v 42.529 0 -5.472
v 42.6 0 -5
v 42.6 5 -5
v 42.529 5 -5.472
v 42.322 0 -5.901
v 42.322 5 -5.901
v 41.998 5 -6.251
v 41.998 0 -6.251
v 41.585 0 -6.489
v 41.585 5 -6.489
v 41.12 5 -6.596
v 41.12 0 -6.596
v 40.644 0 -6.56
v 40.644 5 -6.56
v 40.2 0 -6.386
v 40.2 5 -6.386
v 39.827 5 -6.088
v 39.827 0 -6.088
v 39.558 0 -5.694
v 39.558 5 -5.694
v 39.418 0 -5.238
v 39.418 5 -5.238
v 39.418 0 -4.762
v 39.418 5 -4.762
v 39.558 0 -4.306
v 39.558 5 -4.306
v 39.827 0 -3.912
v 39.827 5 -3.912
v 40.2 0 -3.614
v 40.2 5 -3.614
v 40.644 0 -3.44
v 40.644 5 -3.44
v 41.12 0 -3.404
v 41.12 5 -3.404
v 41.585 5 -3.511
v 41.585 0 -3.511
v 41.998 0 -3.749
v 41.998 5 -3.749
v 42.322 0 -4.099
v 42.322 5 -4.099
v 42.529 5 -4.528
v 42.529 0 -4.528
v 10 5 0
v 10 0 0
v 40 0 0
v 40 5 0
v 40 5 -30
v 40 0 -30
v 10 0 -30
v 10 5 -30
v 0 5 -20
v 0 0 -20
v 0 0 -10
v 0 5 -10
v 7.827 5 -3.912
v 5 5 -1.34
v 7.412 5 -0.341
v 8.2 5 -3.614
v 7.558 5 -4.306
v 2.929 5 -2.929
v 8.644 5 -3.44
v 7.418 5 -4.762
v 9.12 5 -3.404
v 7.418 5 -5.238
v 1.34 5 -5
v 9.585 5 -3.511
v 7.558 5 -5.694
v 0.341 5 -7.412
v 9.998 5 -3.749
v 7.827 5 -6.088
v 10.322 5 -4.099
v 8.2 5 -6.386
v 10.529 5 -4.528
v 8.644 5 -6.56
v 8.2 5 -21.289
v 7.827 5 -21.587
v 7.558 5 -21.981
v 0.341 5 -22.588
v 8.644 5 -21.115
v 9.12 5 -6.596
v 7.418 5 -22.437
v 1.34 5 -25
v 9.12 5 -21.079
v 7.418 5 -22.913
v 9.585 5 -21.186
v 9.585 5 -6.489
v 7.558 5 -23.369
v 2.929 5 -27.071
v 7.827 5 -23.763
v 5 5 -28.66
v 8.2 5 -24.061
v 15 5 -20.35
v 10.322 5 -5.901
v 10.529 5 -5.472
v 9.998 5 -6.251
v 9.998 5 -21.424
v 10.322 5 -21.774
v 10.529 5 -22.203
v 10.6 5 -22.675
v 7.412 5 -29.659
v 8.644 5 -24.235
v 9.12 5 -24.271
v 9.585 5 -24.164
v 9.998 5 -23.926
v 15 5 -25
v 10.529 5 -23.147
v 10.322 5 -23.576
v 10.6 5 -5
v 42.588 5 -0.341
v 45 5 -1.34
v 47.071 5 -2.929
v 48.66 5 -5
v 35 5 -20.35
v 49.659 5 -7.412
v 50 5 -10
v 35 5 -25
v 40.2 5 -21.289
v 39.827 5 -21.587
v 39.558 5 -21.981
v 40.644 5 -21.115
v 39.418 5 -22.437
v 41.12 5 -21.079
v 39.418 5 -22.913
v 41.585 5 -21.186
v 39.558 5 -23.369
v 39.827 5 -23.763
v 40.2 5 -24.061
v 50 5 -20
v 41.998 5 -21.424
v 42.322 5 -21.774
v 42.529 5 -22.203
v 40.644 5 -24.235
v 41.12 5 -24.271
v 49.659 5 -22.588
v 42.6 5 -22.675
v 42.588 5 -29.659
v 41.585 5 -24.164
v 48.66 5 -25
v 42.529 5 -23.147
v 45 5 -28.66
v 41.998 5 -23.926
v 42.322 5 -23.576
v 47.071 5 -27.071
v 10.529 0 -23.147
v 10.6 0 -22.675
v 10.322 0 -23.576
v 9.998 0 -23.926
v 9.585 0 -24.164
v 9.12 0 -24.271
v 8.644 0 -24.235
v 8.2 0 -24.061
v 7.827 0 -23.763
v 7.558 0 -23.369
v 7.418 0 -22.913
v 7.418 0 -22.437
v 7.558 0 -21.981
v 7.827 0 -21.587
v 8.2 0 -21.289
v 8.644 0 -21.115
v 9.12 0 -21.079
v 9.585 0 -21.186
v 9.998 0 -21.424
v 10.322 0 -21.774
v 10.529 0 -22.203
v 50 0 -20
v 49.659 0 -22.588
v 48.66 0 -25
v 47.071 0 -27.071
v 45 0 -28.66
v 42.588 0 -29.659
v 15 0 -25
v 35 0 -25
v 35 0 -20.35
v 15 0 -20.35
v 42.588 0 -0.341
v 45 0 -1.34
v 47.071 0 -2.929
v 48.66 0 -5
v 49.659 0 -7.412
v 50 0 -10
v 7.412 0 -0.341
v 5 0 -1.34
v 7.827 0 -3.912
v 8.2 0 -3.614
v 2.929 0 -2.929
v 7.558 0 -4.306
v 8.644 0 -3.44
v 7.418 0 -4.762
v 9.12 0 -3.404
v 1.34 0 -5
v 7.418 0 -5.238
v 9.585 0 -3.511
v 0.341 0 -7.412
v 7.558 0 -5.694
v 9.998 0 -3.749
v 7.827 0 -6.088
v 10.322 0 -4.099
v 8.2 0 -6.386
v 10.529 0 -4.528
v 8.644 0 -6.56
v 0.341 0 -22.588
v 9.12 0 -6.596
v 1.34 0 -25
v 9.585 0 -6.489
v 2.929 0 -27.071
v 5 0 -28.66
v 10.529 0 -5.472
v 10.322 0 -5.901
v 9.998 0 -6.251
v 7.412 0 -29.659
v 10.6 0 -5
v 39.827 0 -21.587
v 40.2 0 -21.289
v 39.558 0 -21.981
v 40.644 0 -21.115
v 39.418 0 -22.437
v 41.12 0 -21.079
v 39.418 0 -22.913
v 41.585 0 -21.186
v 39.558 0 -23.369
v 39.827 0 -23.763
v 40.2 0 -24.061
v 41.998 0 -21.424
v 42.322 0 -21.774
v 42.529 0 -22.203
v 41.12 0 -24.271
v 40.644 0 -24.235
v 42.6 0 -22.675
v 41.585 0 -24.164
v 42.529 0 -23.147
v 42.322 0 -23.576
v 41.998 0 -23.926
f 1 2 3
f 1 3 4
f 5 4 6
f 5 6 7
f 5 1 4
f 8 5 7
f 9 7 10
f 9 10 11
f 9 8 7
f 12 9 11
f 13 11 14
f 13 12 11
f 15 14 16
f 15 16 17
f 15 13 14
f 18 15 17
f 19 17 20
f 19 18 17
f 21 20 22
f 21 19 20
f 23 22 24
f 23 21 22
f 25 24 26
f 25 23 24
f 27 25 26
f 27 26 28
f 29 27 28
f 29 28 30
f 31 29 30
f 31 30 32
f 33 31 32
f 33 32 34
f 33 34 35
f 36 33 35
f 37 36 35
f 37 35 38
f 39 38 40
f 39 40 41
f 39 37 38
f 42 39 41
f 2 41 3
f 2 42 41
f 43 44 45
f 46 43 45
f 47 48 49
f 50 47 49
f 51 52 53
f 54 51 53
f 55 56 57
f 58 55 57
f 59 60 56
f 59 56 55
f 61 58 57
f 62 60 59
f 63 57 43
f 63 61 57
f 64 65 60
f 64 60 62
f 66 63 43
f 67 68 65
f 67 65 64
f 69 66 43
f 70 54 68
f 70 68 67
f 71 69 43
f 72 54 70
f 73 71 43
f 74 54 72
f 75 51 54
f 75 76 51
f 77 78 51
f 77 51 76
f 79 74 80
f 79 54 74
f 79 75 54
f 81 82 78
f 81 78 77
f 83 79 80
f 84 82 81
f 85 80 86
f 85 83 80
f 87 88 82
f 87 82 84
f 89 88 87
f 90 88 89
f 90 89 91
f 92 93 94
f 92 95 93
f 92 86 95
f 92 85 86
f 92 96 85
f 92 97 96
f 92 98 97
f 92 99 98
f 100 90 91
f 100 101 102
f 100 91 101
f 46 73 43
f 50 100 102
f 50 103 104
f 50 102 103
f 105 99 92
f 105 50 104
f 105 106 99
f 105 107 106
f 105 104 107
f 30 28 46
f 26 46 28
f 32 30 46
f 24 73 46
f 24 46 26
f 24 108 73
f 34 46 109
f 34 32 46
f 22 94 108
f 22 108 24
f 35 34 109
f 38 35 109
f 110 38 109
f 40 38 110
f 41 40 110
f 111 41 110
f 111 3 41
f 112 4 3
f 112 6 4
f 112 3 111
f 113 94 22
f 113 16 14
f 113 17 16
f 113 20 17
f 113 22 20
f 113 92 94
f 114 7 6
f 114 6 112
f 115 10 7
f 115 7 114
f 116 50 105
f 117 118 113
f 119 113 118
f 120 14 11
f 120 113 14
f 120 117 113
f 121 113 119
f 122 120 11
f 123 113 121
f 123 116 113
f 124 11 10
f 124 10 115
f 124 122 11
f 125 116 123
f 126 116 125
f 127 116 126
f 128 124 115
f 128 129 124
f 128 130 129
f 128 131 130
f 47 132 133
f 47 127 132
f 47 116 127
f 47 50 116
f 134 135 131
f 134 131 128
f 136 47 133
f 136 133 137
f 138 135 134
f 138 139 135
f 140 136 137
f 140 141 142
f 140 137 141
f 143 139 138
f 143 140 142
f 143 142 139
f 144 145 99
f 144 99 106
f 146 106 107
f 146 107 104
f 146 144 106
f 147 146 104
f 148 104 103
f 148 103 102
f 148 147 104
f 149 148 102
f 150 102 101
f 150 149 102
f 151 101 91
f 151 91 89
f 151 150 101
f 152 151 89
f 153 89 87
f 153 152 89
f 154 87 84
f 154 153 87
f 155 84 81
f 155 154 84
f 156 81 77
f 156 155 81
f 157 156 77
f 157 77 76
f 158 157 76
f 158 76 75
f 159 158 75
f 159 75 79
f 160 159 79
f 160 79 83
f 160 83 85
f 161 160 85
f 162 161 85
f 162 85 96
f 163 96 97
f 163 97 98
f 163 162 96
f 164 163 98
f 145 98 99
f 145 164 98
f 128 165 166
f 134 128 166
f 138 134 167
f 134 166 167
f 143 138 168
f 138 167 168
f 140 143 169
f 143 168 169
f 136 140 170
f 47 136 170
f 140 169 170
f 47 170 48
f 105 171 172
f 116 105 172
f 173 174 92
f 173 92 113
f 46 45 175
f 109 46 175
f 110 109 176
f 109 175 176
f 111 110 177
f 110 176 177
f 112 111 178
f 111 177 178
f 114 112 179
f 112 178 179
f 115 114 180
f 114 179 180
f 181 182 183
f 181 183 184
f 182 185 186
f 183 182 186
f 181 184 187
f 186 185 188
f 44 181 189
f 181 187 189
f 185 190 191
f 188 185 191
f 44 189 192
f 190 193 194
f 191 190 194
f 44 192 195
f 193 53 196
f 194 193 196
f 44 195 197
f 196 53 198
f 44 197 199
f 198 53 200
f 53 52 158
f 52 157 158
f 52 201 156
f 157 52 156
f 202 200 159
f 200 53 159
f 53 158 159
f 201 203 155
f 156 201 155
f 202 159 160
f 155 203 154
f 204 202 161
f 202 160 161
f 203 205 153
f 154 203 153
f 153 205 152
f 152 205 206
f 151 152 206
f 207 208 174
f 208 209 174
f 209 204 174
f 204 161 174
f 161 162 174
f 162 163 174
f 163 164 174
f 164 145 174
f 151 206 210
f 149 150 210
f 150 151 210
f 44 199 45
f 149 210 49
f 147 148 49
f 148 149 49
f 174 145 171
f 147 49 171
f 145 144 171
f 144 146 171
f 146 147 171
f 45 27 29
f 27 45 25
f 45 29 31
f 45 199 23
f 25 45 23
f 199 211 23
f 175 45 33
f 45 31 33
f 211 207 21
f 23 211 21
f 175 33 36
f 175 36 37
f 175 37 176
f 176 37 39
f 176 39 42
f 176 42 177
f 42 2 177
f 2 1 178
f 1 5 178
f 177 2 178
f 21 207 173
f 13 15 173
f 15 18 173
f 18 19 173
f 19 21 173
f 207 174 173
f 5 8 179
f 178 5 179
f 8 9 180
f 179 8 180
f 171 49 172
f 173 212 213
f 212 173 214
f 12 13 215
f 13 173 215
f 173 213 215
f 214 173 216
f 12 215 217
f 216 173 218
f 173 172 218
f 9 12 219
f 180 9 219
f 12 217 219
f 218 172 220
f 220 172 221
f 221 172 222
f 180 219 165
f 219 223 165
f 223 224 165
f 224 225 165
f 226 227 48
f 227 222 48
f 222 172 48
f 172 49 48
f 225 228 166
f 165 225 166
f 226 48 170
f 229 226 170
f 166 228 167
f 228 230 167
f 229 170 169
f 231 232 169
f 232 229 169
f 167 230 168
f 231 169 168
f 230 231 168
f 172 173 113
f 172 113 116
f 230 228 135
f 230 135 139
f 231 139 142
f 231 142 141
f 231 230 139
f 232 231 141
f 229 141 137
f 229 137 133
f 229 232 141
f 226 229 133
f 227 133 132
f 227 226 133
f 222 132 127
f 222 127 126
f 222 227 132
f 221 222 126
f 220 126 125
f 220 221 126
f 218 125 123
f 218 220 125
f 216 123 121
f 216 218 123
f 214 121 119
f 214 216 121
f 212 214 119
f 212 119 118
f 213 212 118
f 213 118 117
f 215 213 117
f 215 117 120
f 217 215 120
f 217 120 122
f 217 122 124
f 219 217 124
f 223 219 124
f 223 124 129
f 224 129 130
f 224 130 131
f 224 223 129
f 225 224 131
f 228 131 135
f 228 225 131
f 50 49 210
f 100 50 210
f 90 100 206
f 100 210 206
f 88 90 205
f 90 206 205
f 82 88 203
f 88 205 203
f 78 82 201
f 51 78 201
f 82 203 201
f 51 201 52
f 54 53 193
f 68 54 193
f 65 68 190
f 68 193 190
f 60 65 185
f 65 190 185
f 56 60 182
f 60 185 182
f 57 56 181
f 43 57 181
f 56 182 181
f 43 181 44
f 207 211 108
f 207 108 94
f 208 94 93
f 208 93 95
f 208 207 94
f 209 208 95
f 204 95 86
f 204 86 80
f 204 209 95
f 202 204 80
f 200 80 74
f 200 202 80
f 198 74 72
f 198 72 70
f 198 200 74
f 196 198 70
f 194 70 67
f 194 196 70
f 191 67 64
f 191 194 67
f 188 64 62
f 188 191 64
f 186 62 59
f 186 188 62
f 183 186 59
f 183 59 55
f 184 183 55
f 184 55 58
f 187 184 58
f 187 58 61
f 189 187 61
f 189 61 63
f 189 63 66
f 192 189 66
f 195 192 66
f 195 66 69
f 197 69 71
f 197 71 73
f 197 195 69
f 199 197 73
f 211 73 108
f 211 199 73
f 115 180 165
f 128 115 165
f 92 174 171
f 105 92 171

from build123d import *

# Parameters (mm, degrees)
SKETCH2_R           = 1.6
SKETCH2_W           = 20
SKETCH2_H           = 4.65
BOSS_EXTRUDE1_DEPTH = 5


with BuildPart() as part:
    # Sketch2 → Boss-Extrude1 (new body)
    with BuildSketch(Plane(origin=(0, 0, 0), x_dir=(1, 0, 0), z_dir=(0, 1, 0))):
        with BuildLine():
            Line((10, 0), (40, 0))
            ThreePointArc((40, 0), (47.071067812, 2.928932188), (50, 10))
            Line((50, 10), (50, 20))
            ThreePointArc((50, 20), (47.071067812, 27.071067812), (40, 30))
            Line((40, 30), (10, 30))
            ThreePointArc((10, 30), (2.928932188, 27.071067812), (0, 20))
            Line((0, 20), (0, 10))
            ThreePointArc((0, 10), (2.928932188, 2.928932188), (10, 0))
        make_face()
        with Locations((9, 5)):
            Circle(SKETCH2_R, mode=Mode.SUBTRACT)
        with Locations((41, 5)):
            Circle(SKETCH2_R, mode=Mode.SUBTRACT)
        with Locations((9, 22.675)):
            Circle(SKETCH2_R, mode=Mode.SUBTRACT)
        with Locations((41, 22.675)):
            Circle(SKETCH2_R, mode=Mode.SUBTRACT)
        with Locations((25, 22.675)):
            Rectangle(SKETCH2_W, SKETCH2_H, mode=Mode.SUBTRACT)
    extrude(amount=BOSS_EXTRUDE1_DEPTH)


solid = part.part
